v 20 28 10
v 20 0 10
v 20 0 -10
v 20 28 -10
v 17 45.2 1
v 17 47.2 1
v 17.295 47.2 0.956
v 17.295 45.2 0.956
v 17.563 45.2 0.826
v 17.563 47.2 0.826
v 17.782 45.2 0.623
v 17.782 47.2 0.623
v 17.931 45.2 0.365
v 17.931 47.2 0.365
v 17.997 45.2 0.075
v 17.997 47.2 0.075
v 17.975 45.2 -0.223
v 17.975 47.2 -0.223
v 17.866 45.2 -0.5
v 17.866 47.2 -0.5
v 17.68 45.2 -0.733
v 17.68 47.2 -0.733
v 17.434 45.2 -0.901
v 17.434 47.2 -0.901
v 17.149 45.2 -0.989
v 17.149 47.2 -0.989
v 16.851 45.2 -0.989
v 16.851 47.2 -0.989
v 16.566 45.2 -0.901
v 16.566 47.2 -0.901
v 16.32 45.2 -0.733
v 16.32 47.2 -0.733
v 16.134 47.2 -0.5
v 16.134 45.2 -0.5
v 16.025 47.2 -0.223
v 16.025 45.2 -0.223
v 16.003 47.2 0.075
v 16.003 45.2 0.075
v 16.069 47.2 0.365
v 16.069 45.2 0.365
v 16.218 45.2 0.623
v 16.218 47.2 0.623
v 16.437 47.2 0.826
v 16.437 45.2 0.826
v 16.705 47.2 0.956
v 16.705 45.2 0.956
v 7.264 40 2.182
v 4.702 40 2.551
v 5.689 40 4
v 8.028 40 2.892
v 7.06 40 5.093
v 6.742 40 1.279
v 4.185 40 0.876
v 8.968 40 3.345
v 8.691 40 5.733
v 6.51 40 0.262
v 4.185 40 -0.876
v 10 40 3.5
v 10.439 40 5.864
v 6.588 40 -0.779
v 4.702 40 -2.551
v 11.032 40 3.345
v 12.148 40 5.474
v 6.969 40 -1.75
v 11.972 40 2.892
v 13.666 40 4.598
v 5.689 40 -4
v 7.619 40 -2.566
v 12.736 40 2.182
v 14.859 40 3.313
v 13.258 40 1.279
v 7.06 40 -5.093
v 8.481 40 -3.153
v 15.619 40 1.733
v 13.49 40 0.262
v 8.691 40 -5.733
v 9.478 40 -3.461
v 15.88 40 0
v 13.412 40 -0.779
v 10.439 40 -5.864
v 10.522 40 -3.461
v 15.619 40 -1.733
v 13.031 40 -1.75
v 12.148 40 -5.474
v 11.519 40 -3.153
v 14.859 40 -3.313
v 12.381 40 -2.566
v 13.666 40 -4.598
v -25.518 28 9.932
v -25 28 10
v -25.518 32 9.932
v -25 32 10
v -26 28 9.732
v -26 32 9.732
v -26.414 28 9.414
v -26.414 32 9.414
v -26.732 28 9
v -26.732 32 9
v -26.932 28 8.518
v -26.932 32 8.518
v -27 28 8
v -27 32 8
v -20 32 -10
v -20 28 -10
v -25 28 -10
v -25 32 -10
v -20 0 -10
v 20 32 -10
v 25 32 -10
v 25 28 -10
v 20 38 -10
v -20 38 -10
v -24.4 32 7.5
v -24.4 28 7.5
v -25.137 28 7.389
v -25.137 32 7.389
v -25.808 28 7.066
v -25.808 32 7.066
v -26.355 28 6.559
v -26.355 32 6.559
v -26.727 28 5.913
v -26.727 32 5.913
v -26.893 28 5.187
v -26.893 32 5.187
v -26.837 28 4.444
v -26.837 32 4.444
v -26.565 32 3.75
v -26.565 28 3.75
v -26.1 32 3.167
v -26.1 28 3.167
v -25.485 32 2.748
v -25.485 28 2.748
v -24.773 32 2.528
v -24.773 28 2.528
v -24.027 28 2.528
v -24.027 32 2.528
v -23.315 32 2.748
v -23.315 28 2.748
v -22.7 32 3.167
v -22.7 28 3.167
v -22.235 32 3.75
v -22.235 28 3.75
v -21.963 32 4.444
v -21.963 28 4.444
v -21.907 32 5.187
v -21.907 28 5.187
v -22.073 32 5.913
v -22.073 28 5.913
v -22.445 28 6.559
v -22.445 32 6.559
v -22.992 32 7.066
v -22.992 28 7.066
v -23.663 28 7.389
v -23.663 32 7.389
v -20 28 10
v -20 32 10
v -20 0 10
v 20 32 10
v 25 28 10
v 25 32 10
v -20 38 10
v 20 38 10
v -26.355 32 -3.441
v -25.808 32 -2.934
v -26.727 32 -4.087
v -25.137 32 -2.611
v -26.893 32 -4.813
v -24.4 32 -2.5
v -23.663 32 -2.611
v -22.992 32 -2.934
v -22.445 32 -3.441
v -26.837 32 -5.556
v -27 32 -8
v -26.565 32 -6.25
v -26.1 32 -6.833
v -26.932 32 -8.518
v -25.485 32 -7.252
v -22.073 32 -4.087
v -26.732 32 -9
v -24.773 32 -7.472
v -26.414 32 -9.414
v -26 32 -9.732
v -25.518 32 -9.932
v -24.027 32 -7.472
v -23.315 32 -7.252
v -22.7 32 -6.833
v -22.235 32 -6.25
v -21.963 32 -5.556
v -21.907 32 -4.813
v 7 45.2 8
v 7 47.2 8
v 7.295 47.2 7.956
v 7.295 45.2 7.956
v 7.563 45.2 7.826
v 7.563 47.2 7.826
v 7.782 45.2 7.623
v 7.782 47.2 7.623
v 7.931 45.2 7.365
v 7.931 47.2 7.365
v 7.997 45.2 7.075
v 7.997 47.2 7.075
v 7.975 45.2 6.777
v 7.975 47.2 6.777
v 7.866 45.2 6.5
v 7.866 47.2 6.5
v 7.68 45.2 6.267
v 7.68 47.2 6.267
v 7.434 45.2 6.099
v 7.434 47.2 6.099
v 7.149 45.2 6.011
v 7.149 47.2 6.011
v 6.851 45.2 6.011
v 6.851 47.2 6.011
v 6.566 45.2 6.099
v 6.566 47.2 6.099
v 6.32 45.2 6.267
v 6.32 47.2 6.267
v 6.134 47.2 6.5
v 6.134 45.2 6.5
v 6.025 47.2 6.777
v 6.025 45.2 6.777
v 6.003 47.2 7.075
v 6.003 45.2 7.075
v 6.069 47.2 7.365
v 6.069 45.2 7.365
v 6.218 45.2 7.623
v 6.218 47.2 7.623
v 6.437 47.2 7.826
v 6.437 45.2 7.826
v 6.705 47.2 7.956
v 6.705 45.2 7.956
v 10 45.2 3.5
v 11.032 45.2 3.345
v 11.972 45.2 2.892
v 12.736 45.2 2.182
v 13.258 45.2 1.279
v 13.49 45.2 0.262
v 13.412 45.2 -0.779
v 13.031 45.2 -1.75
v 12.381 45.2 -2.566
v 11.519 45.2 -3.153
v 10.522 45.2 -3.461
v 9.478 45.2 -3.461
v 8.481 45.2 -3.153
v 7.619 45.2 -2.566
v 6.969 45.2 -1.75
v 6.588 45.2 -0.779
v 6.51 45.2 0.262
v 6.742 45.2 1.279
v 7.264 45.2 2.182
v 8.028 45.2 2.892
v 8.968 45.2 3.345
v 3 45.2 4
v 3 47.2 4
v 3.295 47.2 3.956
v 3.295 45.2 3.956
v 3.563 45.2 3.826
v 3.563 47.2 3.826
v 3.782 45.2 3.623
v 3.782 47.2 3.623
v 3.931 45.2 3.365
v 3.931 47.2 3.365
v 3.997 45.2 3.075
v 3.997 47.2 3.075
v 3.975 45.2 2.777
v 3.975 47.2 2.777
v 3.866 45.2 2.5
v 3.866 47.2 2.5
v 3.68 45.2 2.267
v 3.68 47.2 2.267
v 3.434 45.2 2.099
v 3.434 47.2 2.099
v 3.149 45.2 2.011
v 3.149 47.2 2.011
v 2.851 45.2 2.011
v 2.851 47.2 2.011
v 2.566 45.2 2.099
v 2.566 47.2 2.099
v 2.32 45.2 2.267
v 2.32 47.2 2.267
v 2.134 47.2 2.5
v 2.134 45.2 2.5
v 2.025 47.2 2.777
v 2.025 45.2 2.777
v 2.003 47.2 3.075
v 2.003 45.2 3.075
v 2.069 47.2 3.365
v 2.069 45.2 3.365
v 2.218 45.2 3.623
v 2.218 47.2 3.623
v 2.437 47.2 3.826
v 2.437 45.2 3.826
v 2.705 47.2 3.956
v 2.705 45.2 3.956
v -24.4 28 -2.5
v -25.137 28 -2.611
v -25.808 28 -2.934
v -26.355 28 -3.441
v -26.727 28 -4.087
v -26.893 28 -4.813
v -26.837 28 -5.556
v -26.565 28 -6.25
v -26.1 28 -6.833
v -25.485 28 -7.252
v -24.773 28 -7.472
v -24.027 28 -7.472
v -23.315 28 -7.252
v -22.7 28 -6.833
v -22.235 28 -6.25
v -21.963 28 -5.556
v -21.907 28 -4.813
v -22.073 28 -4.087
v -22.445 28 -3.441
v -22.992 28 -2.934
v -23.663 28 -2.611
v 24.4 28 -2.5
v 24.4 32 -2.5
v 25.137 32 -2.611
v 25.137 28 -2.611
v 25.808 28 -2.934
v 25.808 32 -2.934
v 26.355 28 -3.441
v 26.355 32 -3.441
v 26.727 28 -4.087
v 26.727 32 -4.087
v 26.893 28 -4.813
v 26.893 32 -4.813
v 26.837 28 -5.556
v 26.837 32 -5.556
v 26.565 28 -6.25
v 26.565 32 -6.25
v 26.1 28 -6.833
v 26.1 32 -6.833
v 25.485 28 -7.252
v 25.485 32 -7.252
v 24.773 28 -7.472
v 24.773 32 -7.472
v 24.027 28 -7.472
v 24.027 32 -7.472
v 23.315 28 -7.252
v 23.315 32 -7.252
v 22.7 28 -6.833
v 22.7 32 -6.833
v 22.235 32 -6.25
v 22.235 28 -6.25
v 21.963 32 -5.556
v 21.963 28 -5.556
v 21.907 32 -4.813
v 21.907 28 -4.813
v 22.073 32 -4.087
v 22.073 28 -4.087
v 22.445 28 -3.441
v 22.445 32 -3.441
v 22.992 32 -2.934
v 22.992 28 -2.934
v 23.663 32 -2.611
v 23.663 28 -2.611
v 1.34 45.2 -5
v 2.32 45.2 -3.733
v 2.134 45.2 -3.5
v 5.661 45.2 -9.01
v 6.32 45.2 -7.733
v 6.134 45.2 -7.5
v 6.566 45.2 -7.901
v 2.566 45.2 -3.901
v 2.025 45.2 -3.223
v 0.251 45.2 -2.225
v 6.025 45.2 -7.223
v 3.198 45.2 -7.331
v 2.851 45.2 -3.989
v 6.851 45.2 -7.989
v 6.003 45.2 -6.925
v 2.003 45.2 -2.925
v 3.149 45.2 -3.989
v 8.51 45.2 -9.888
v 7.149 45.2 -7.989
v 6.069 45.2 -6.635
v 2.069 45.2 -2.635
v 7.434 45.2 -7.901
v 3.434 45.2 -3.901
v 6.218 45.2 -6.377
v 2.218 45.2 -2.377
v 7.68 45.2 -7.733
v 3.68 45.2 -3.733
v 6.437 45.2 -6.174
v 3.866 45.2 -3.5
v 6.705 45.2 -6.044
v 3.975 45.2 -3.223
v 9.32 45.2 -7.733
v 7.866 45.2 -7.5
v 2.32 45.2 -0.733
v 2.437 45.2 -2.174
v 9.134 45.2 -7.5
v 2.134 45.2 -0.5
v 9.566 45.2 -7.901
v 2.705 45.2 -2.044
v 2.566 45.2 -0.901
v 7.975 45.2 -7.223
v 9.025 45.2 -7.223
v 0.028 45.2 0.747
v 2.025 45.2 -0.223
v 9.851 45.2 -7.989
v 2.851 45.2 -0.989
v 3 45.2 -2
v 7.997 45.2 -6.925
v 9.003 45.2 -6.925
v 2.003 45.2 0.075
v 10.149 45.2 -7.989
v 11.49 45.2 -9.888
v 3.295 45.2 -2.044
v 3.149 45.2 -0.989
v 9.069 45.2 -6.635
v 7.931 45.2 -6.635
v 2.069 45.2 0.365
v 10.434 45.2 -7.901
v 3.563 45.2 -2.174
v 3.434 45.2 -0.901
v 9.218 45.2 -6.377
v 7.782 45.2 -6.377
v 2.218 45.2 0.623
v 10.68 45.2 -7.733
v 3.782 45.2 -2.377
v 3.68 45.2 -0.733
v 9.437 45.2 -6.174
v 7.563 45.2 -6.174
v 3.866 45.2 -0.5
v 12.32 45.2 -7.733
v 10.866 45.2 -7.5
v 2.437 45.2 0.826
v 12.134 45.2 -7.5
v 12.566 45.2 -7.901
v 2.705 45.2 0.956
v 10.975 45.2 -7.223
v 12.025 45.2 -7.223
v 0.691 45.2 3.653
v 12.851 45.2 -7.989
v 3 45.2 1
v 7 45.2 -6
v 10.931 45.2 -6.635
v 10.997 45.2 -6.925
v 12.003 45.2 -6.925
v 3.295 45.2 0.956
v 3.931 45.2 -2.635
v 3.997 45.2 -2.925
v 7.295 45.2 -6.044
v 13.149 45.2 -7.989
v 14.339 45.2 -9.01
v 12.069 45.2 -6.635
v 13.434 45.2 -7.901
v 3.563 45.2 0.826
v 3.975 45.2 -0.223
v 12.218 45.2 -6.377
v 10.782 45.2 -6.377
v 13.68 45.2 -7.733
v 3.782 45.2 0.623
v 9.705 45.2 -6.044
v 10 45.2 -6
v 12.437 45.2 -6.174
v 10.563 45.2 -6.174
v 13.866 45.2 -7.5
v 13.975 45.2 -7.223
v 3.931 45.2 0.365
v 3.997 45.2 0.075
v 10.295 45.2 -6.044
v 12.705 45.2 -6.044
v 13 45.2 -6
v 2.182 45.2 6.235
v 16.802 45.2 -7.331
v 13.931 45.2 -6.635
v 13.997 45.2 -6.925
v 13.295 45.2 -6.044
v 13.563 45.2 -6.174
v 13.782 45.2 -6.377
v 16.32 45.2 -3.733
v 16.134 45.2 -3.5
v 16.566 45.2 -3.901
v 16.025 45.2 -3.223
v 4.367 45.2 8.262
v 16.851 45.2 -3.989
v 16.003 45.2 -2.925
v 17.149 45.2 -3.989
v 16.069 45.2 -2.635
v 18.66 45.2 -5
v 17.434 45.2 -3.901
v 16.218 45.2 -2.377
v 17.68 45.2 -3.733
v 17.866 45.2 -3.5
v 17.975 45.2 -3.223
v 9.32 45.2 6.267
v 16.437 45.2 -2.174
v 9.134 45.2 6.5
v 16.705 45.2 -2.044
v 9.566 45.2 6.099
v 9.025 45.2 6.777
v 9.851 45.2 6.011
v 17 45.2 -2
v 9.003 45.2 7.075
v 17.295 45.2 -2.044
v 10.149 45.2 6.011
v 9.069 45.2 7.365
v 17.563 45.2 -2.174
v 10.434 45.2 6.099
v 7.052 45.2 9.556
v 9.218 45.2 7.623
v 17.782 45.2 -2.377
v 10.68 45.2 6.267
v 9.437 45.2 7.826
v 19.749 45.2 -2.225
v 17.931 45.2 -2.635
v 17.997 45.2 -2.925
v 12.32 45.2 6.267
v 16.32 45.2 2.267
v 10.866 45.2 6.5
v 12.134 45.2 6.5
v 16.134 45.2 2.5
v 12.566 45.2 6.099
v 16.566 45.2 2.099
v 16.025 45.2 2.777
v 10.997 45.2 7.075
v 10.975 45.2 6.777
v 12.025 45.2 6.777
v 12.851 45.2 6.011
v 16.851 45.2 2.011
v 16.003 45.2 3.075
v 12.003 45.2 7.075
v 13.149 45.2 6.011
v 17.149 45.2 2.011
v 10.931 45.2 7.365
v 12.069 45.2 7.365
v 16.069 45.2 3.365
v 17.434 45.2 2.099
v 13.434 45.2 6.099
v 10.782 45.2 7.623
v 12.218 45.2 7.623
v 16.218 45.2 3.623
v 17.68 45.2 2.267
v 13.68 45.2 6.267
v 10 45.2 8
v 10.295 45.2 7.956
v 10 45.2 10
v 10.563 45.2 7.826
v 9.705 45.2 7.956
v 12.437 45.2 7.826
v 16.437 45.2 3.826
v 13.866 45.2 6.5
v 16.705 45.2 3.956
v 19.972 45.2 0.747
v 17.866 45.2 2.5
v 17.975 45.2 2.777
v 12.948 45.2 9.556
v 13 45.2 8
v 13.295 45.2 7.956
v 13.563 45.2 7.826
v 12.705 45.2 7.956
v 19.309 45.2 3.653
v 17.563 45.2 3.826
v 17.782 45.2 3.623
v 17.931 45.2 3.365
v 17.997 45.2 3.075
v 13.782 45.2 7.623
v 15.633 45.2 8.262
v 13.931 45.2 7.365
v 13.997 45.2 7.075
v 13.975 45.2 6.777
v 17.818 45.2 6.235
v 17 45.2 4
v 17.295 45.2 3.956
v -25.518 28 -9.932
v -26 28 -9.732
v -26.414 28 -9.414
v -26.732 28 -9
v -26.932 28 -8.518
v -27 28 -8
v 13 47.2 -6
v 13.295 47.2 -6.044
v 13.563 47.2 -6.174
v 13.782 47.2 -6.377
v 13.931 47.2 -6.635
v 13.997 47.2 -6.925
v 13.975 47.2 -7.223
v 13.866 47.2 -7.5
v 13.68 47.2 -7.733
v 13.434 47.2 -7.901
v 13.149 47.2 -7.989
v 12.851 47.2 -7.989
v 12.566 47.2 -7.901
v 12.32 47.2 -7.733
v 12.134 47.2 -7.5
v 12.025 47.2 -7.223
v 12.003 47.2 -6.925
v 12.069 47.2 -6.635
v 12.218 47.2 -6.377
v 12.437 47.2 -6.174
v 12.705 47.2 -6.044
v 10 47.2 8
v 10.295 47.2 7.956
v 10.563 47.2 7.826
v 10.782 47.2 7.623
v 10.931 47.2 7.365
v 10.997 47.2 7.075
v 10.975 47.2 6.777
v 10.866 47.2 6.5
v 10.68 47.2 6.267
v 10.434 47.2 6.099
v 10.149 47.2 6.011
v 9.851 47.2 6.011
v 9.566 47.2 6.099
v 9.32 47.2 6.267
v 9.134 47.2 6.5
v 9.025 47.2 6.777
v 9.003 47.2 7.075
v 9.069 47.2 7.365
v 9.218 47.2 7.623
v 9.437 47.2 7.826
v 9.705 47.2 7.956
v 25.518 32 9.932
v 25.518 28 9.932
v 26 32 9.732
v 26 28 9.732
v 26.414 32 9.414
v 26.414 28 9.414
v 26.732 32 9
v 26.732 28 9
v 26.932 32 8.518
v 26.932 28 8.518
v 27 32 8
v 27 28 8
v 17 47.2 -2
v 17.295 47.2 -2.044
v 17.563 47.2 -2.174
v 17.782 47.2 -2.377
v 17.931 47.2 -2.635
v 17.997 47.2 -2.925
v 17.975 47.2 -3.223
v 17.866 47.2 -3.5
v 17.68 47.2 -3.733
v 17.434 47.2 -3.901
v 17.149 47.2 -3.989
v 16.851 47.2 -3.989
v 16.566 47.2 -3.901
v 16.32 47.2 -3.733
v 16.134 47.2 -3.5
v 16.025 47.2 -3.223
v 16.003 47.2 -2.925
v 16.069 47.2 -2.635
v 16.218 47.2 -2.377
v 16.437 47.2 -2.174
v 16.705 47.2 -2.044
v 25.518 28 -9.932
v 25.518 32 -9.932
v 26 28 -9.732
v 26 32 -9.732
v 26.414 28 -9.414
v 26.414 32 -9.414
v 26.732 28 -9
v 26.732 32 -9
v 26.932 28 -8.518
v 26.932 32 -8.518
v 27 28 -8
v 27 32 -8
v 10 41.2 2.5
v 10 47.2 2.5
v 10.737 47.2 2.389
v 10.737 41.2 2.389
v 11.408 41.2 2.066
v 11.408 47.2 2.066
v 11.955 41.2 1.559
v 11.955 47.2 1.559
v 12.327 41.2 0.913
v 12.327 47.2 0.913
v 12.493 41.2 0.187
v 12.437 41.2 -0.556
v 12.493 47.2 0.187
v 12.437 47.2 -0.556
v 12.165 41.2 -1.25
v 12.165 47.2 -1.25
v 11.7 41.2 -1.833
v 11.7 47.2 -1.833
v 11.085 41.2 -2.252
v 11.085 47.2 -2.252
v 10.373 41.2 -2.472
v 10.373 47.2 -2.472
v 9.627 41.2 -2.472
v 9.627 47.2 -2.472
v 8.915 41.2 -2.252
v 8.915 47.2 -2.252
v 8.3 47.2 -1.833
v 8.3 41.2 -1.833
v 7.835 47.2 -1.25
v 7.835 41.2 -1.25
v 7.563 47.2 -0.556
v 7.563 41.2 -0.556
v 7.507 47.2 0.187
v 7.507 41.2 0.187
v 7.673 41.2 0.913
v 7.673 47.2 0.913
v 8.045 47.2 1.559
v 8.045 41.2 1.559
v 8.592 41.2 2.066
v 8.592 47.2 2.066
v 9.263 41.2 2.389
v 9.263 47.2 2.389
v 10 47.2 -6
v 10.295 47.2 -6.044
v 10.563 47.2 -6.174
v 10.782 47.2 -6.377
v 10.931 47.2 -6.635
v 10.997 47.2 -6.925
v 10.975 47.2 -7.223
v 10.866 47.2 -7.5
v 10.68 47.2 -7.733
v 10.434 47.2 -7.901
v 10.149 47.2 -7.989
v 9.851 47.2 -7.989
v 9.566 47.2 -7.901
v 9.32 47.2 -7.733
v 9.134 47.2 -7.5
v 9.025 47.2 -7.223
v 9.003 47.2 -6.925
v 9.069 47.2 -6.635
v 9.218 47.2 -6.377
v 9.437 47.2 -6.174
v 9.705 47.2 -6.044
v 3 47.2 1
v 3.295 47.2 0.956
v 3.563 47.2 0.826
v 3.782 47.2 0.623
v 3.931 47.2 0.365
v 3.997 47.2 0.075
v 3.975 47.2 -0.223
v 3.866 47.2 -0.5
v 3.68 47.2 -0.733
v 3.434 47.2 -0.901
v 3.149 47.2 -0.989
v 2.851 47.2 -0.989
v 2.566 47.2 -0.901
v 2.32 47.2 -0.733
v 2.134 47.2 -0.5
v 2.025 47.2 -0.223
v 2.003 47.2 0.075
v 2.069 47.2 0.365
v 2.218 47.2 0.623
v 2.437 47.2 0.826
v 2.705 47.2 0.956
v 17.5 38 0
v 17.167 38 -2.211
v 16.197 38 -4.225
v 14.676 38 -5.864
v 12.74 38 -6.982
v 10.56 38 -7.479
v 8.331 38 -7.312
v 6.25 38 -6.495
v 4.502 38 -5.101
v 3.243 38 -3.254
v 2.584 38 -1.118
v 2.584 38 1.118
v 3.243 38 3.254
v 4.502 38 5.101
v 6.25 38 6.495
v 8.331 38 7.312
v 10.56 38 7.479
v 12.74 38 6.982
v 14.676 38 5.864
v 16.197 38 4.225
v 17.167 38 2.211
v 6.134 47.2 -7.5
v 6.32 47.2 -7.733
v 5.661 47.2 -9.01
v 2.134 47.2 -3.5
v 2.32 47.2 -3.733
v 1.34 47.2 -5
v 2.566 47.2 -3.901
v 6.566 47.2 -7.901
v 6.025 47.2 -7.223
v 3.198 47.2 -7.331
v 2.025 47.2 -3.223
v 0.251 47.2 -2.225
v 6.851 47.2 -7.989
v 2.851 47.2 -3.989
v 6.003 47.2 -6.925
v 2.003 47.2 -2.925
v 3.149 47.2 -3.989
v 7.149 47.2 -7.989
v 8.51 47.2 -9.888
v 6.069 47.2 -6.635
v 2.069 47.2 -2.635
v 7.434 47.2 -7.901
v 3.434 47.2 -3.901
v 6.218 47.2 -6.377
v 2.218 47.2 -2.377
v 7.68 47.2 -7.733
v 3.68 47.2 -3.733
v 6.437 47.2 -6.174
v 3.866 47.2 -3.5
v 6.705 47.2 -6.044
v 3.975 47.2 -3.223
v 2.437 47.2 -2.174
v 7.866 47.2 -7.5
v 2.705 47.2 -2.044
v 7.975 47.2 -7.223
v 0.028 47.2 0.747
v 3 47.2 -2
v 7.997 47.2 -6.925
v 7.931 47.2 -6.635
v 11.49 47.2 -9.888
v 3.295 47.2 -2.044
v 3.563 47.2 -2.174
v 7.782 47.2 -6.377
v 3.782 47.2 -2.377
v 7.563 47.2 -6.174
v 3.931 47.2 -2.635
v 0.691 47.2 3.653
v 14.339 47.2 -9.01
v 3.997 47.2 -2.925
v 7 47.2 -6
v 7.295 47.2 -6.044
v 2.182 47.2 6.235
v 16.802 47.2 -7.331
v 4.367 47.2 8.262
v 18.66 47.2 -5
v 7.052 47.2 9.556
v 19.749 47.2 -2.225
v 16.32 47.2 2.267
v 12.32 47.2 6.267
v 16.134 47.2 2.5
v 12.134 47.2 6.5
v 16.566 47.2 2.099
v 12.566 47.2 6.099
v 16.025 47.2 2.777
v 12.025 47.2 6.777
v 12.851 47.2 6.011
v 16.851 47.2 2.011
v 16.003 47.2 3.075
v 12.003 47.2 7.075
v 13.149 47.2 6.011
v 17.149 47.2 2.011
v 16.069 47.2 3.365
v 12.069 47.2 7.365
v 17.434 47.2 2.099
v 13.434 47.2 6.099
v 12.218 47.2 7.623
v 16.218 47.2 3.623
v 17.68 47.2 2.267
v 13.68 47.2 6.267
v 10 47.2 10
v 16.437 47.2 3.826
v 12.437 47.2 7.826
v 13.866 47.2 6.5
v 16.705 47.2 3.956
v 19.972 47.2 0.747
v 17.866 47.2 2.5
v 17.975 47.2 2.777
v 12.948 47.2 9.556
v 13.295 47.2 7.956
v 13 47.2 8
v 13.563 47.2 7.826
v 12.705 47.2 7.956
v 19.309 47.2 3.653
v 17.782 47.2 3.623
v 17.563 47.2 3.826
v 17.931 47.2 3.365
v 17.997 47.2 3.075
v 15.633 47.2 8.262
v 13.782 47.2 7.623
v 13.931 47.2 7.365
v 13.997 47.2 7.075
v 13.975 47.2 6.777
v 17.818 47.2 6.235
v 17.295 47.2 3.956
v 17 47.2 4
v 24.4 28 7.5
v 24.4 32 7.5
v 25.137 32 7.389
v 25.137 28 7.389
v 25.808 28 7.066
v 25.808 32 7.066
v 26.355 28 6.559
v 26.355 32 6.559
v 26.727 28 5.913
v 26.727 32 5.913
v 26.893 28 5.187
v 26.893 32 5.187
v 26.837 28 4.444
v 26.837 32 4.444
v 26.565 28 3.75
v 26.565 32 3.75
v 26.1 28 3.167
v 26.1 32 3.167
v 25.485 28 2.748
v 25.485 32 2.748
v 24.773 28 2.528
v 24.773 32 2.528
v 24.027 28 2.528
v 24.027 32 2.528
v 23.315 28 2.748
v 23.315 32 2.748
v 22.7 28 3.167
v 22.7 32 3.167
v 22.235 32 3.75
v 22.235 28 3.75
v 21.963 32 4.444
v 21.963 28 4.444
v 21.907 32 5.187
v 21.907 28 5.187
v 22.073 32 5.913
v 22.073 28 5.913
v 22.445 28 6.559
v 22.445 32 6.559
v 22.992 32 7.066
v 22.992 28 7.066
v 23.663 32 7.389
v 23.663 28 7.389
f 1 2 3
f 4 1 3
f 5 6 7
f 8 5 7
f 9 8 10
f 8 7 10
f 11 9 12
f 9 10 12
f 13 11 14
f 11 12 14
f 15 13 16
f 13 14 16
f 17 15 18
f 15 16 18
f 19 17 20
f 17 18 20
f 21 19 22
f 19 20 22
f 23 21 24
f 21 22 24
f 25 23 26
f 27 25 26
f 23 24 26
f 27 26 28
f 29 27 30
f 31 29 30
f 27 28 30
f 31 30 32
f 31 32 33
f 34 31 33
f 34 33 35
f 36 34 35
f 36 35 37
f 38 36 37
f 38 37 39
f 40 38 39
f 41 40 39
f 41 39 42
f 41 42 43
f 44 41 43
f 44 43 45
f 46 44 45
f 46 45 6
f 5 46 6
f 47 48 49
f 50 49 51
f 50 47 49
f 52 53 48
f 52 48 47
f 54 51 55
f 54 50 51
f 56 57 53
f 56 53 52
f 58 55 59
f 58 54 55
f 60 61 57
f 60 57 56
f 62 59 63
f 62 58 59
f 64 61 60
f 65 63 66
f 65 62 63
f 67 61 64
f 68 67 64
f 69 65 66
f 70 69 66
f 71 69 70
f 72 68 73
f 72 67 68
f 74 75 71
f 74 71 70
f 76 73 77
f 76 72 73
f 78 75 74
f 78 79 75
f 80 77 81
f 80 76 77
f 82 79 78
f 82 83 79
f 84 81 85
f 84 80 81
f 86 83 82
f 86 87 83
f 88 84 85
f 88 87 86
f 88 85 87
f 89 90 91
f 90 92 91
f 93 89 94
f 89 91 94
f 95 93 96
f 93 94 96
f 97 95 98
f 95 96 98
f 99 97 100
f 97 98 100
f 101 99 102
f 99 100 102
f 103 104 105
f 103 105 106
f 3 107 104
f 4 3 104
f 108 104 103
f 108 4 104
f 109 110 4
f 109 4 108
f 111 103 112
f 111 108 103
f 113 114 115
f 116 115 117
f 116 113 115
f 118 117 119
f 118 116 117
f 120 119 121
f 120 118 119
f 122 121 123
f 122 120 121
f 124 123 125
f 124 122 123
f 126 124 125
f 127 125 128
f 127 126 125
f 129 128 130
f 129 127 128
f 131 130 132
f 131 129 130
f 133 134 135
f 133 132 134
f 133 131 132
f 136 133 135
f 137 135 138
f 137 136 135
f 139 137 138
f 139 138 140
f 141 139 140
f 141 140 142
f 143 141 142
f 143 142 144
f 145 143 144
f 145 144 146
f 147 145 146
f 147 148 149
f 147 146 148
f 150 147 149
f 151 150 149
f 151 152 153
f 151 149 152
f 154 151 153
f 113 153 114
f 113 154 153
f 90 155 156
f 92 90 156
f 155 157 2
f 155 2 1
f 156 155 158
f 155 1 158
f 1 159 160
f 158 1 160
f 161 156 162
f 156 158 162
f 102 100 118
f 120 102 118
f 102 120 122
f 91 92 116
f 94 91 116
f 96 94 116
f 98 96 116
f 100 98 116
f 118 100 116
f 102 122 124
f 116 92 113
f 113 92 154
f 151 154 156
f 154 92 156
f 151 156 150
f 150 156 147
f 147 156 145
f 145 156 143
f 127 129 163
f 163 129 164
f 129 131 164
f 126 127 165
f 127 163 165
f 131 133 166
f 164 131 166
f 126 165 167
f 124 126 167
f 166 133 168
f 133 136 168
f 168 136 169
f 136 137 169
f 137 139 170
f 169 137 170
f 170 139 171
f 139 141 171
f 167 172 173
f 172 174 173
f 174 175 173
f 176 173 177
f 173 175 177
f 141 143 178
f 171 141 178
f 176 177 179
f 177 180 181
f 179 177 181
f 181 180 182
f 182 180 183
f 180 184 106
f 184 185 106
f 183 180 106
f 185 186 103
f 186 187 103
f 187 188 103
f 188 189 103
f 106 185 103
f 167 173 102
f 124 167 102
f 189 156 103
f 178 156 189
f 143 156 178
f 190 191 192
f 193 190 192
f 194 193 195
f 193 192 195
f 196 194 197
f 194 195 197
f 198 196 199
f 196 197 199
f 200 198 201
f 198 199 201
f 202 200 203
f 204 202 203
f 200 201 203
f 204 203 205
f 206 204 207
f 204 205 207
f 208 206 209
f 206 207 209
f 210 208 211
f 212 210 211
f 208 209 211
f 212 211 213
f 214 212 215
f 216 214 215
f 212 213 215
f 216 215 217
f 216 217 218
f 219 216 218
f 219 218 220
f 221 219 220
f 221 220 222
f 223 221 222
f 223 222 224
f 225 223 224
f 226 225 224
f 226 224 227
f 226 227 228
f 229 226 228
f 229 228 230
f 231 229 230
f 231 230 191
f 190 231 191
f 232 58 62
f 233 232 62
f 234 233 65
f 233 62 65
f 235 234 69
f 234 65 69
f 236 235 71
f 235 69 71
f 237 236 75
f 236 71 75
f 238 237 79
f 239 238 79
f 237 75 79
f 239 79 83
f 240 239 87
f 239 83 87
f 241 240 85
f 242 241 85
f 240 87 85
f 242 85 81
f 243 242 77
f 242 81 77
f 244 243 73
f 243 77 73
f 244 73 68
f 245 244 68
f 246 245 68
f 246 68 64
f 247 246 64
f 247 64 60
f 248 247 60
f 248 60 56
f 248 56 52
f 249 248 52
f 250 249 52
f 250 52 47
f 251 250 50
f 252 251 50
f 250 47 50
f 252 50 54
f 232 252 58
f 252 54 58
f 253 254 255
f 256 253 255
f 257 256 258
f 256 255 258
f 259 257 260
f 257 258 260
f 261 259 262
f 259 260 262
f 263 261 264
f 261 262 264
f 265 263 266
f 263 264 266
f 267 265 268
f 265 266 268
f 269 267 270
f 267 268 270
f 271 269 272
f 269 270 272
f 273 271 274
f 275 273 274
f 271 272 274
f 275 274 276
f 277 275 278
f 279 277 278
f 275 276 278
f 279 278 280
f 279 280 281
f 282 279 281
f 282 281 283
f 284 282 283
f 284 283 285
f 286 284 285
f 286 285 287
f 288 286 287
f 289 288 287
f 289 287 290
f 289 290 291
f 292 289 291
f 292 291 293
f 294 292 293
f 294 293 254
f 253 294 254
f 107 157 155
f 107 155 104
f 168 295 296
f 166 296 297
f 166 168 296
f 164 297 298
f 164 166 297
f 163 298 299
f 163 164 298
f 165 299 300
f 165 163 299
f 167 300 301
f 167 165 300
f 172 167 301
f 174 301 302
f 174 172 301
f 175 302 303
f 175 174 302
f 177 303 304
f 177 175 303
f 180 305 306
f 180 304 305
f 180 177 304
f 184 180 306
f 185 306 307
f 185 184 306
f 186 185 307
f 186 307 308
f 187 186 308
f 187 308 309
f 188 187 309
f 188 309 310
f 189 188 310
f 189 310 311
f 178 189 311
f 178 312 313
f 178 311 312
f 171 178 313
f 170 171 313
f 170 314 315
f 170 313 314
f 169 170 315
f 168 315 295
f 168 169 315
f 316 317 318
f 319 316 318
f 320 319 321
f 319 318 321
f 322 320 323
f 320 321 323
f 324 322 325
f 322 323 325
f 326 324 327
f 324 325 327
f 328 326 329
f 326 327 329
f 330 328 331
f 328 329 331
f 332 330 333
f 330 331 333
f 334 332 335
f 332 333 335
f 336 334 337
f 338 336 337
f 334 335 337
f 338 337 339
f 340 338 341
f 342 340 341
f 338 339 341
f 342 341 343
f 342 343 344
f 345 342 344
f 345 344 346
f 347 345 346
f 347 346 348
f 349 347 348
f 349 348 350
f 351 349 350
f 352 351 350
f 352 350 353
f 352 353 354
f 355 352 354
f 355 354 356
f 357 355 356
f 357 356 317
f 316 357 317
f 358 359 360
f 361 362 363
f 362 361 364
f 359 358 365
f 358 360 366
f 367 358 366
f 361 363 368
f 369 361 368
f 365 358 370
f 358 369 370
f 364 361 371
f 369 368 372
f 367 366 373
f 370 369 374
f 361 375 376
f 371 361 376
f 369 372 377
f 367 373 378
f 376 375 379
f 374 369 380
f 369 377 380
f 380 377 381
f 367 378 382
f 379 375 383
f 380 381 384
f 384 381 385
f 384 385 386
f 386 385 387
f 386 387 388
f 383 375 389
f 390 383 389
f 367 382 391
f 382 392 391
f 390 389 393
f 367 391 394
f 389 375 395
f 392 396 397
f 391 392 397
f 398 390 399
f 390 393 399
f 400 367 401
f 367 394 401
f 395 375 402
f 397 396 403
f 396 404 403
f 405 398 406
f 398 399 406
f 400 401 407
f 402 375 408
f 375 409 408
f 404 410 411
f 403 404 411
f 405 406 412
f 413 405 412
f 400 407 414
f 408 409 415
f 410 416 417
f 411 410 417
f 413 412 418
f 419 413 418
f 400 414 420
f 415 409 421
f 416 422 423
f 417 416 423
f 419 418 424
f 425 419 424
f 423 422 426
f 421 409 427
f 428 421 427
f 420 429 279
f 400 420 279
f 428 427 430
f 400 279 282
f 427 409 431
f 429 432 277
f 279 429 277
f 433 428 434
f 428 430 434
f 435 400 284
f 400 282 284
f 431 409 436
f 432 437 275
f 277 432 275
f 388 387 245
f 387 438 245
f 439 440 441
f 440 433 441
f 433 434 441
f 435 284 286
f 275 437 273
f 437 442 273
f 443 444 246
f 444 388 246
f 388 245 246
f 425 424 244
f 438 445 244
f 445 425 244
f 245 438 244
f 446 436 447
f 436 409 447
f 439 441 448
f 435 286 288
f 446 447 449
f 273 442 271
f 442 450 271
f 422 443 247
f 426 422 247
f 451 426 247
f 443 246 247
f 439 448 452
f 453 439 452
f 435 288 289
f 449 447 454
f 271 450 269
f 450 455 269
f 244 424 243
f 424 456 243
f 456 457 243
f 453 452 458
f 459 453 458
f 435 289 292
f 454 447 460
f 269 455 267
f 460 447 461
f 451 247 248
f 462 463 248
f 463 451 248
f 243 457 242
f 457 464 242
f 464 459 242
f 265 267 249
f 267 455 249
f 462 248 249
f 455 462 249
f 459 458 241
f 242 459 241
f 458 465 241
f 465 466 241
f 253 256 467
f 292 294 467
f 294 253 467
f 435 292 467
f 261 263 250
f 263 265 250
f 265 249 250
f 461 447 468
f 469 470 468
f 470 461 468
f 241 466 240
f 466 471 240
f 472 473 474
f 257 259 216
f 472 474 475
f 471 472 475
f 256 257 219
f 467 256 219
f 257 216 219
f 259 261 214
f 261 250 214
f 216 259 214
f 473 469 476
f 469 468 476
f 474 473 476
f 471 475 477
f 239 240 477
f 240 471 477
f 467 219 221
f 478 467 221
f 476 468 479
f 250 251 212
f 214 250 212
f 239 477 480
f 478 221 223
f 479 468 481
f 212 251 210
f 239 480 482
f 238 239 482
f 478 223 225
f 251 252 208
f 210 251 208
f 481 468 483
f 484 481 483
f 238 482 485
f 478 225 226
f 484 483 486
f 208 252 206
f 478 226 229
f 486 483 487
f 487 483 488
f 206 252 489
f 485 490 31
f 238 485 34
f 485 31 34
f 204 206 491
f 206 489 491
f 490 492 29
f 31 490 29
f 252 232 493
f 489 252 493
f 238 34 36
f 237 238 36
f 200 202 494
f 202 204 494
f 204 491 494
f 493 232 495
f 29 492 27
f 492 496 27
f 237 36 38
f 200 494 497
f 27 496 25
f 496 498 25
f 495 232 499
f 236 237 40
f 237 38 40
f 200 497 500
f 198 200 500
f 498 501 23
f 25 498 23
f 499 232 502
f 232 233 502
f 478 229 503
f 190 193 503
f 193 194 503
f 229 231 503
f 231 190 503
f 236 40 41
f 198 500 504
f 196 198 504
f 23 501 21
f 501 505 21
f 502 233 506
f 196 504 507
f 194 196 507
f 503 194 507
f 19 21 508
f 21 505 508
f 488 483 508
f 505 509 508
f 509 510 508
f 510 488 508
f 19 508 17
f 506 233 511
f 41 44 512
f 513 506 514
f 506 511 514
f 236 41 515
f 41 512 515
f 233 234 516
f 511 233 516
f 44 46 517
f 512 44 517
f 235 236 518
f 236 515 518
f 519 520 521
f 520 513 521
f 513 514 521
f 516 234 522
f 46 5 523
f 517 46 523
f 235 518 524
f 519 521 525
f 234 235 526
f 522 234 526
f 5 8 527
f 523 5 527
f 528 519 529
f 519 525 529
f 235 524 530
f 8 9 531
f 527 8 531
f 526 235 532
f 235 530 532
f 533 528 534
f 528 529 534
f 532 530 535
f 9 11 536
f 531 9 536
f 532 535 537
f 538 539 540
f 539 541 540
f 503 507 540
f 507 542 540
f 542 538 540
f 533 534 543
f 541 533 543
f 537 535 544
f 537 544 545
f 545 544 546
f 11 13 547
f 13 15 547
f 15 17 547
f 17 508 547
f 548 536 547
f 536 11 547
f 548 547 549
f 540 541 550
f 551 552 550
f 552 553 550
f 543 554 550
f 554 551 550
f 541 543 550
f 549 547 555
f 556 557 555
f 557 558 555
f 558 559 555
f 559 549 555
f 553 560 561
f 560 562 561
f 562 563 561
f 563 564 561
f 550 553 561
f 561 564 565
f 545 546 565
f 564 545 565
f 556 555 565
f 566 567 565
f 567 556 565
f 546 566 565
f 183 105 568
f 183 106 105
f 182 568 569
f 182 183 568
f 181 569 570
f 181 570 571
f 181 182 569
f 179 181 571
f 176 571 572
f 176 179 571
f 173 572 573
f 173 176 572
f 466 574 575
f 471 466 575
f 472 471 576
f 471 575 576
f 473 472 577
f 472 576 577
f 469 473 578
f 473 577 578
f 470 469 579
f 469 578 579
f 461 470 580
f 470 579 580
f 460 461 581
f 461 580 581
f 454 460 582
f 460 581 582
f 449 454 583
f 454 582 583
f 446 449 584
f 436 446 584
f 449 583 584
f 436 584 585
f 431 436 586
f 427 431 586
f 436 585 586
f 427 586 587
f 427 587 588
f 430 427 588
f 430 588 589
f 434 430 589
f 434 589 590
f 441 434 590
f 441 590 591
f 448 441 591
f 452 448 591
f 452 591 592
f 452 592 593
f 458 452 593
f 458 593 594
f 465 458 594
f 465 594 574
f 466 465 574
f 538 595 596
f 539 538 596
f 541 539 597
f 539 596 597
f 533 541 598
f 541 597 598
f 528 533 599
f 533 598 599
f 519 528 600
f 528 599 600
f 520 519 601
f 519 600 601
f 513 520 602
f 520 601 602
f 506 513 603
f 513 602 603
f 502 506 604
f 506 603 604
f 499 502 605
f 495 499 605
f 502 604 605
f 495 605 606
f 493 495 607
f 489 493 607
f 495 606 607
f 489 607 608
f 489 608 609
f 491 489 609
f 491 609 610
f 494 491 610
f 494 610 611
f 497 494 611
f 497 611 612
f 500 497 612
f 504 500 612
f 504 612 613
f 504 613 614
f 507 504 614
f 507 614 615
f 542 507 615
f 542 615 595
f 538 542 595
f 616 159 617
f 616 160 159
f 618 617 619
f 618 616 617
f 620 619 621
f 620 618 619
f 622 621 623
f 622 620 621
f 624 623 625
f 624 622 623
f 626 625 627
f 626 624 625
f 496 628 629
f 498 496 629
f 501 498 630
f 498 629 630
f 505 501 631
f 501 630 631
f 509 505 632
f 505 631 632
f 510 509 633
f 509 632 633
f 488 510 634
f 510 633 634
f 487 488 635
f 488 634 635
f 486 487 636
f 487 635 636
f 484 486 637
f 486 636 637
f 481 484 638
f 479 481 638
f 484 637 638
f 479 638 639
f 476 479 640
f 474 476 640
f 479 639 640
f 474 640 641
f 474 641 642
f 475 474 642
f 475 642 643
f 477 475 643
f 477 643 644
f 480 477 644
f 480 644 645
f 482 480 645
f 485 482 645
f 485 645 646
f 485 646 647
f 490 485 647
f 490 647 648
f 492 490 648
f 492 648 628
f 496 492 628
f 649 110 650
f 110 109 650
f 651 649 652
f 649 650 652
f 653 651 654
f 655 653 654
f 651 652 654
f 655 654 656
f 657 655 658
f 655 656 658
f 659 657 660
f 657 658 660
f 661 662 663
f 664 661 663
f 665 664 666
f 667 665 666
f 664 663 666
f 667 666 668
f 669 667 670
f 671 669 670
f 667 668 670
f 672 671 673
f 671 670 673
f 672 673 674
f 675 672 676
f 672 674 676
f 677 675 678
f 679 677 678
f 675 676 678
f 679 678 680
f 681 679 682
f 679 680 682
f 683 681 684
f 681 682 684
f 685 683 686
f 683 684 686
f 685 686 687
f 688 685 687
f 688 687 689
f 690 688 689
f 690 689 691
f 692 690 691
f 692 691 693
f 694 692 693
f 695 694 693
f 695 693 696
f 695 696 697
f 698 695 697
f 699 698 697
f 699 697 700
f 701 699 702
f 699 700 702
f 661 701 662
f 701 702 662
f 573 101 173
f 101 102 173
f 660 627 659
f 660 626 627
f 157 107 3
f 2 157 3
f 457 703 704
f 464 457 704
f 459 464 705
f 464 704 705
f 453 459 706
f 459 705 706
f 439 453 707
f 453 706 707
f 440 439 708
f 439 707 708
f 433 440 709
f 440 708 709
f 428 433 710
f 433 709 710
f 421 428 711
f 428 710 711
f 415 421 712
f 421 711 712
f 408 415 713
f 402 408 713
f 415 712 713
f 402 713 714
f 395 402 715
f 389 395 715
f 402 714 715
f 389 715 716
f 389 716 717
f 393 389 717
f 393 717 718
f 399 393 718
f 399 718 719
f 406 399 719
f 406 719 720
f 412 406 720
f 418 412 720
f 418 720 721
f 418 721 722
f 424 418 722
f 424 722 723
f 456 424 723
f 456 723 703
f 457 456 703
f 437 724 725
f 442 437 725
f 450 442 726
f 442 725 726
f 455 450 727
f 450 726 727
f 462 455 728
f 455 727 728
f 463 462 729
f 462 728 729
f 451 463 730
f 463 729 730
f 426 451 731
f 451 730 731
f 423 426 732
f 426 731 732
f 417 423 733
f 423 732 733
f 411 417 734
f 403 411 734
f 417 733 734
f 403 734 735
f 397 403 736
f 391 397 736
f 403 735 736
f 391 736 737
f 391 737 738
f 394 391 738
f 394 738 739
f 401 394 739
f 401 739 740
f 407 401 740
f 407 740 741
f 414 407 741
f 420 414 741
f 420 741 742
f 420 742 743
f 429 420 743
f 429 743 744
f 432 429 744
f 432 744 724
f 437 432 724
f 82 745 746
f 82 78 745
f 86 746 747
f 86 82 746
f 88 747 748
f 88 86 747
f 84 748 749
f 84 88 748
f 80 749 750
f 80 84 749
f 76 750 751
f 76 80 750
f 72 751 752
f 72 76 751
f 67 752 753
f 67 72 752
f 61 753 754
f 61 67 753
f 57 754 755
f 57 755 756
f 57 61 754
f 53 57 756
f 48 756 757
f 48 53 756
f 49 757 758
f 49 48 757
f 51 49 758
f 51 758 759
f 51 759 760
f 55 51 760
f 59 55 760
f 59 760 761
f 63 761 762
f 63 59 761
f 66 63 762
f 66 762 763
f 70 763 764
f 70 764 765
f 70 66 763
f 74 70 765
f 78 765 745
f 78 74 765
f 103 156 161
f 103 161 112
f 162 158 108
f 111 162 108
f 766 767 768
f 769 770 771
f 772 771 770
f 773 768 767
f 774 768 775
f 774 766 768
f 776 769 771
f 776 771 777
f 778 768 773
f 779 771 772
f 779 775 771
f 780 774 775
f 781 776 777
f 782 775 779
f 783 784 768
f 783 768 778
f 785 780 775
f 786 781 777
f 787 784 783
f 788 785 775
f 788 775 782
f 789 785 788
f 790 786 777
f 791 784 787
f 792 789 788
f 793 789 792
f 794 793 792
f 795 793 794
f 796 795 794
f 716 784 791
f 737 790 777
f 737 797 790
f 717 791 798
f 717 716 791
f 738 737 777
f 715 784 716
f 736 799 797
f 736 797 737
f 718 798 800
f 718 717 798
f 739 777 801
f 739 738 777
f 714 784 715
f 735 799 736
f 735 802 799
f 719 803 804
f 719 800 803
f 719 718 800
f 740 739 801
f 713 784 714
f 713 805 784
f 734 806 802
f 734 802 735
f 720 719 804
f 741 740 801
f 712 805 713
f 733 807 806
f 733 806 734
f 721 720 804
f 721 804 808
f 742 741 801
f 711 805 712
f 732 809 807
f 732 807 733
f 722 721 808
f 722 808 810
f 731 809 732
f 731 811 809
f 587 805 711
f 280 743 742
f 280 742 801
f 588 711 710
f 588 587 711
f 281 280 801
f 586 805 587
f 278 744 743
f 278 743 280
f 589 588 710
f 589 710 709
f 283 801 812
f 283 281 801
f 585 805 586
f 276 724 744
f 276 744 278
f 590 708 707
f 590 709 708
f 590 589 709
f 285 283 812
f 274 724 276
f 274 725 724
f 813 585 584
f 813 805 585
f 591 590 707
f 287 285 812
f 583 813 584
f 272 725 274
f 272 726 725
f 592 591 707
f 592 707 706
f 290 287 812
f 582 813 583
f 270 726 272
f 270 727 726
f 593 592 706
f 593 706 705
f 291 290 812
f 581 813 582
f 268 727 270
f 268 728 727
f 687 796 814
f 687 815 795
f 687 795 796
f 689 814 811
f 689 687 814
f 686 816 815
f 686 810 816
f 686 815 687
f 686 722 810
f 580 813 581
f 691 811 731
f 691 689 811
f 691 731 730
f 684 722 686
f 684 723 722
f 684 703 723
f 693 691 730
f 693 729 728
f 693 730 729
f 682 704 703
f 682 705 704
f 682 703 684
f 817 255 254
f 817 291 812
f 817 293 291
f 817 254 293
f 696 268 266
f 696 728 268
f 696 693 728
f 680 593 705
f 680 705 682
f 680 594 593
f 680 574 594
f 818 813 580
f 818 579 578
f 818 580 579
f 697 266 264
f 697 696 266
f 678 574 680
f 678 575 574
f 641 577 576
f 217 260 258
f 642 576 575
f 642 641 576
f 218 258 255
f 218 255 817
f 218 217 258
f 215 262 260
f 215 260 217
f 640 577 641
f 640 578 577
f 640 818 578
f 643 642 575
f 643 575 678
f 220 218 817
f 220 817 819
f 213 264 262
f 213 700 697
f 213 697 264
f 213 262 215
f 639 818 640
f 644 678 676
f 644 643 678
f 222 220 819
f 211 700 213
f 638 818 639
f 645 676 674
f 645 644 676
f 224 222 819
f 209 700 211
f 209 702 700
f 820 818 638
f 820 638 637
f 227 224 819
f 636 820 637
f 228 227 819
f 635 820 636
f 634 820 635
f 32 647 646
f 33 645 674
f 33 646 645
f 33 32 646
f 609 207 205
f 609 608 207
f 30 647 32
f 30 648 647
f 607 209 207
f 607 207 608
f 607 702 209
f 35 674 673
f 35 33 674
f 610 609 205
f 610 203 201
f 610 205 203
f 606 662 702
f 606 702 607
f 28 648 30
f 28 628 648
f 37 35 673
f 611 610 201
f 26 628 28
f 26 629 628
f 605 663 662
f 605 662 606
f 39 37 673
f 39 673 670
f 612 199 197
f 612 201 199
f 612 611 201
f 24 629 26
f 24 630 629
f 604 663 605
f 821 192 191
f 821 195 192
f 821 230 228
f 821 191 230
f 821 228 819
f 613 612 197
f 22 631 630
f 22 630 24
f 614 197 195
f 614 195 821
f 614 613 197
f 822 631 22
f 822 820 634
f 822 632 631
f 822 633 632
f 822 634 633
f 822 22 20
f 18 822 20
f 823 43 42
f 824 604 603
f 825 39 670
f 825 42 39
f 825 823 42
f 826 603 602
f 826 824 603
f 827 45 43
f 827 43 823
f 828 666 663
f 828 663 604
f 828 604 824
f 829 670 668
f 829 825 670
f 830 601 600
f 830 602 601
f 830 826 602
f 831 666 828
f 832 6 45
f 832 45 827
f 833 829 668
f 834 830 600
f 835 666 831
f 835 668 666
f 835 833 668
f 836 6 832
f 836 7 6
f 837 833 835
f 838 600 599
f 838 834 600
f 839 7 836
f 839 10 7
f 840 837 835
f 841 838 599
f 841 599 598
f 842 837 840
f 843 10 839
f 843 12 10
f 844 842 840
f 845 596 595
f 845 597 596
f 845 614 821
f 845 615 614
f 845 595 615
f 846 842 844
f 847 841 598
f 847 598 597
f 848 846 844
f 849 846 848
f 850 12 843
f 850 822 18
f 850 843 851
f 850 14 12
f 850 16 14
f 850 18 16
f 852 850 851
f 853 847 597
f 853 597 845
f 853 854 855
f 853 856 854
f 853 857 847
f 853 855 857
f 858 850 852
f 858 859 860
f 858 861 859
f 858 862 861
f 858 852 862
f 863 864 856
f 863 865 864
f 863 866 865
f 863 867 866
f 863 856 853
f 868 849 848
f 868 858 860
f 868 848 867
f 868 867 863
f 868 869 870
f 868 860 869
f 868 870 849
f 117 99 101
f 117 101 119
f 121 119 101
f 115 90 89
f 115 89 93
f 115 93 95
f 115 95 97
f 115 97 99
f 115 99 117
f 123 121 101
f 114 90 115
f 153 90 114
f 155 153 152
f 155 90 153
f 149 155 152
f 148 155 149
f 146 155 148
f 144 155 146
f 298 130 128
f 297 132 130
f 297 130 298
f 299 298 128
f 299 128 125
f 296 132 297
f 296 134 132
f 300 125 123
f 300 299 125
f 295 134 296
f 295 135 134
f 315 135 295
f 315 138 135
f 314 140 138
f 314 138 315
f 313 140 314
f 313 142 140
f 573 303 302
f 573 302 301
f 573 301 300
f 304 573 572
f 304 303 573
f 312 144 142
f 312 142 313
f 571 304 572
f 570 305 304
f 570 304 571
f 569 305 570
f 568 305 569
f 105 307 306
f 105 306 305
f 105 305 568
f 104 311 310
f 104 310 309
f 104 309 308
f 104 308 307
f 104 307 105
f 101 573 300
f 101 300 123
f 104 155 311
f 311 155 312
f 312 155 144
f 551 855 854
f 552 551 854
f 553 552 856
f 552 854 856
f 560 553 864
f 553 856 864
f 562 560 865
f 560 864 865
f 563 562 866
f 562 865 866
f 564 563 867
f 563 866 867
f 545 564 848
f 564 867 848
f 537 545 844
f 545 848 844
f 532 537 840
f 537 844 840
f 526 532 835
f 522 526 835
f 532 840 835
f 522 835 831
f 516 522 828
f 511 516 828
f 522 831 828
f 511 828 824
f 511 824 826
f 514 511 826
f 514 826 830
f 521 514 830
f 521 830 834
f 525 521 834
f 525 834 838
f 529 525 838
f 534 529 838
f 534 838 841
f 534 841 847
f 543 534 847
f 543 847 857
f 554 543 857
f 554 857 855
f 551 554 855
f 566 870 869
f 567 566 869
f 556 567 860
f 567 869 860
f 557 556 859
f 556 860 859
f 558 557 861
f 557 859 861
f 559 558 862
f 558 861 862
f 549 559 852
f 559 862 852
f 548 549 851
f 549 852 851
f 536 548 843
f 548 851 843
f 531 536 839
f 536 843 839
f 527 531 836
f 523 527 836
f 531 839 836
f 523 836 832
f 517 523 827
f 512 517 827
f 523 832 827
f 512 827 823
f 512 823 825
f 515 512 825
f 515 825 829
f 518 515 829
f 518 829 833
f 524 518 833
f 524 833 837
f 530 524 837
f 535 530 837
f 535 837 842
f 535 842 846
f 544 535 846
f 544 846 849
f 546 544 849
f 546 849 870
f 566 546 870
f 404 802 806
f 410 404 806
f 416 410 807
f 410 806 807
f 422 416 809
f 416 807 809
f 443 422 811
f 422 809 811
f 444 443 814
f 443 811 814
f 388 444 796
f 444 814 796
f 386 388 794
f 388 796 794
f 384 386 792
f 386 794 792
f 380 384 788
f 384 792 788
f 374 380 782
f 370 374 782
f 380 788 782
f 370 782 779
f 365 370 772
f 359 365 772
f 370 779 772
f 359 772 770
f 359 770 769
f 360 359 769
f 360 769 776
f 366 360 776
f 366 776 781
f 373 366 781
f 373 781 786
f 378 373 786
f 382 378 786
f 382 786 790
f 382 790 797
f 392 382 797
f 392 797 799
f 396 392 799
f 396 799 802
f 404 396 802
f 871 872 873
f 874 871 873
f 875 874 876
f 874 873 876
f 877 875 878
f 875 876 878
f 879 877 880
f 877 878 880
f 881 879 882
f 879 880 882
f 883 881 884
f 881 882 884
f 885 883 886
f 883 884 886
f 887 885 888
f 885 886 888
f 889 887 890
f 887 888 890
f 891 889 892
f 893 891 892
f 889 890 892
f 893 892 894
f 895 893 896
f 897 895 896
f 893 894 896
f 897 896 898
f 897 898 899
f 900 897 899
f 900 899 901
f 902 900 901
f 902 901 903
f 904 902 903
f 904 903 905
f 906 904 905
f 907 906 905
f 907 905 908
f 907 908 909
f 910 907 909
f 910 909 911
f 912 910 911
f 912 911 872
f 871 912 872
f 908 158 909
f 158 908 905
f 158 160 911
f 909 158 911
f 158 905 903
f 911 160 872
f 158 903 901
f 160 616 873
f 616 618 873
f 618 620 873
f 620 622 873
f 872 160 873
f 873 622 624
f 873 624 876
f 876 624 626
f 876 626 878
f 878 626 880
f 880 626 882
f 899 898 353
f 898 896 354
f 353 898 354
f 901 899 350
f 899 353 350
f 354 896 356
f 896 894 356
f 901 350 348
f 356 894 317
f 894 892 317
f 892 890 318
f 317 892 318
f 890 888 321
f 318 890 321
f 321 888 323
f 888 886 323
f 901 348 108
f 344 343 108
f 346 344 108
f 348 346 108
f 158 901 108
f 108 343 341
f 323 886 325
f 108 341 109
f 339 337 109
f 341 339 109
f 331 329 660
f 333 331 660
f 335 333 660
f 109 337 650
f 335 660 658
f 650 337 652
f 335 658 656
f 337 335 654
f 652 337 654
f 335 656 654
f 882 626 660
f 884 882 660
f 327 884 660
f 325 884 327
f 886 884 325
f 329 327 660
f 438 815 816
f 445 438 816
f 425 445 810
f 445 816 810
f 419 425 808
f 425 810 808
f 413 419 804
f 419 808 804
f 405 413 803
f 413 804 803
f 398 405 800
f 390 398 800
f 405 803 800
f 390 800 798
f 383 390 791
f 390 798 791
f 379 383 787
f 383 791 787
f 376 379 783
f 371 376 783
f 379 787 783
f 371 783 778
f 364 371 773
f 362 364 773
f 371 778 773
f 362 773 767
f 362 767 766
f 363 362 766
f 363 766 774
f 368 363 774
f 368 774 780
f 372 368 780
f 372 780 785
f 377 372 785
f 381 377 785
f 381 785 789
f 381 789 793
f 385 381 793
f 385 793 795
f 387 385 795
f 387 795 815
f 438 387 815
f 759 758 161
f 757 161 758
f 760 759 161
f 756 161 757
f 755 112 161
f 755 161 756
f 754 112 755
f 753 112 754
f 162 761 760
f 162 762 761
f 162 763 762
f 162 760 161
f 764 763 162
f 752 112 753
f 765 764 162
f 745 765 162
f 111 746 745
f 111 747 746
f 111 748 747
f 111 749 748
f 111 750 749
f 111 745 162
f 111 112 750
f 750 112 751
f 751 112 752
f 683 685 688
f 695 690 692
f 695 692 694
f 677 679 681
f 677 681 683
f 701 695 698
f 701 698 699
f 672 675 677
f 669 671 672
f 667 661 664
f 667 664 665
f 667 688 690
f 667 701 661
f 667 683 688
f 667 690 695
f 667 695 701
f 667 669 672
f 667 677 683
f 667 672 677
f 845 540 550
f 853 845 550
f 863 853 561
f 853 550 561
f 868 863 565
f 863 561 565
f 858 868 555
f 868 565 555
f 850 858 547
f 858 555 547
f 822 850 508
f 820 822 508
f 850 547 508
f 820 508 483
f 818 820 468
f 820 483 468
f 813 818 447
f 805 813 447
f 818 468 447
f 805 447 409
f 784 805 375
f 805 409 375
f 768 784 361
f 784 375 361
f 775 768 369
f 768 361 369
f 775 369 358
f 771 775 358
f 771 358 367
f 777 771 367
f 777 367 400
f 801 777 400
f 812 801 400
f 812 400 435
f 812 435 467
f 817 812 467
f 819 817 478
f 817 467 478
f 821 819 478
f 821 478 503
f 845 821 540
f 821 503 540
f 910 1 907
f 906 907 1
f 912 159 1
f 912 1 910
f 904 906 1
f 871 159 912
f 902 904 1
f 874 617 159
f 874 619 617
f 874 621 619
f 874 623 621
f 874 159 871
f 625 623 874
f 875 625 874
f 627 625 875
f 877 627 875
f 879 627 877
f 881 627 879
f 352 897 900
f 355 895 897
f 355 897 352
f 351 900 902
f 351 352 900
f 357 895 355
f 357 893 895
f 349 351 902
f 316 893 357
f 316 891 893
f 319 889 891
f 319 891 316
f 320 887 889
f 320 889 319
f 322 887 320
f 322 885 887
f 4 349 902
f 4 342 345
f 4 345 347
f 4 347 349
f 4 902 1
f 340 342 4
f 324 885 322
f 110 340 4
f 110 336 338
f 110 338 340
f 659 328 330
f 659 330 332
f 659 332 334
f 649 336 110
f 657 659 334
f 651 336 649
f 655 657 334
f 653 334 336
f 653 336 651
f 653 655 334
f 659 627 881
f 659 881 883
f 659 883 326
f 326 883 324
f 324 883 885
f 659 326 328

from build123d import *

# Parameters (mm, degrees)
SKETCH1_W           = 40
SKETCH1_H           = 20
BOSS_EXTRUDE1_DEPTH = 38
SKETCH2_W           = 20
SKETCH2_H           = 4
BOSS_EXTRUDE2_DEPTH = 27
SKETCH3_R           = 2.5
CUT_EXTRUDE5_DEPTH  = 53.6
SKETCH4_R           = 7.5
BOSS_EXTRUDE3_DEPTH = 2
BOSS_EXTRUDE3_TAPER = 39
SKETCH5_R           = 3.5
BOSS_EXTRUDE4_DEPTH = 5.2
SKETCH6_R           = 10
BOSS_EXTRUDE5_DEPTH = 2
FILLET1_R           = 2
SKETCH7_R           = 2.5
SKETCH7_R_2         = 1
CUT_EXTRUDE9_DEPTH  = 6


with BuildPart() as part:
    # Sketch1 → Boss-Extrude1 (new body)
    with BuildSketch(Plane(origin=(0, 0, 0), x_dir=(1, 0, 0), z_dir=(0, 1, 0))):
        Rectangle(SKETCH1_W, SKETCH1_H)
    extrude(amount=BOSS_EXTRUDE1_DEPTH)

    # Sketch2 → Boss-Extrude2 (add, symmetric)
    with BuildSketch(Plane(origin=(0, 0, 0), x_dir=(0, 0, -1), z_dir=(1, 0, 0))):
        with Locations((0, 30)):
            Rectangle(SKETCH2_W, SKETCH2_H)
    extrude(amount=BOSS_EXTRUDE2_DEPTH, both=True)

    # Sketch3 → Cut-Extrude5 (cut)
    with BuildSketch(Plane(origin=(0, 32, 0), x_dir=(1, 0, 0), z_dir=(0, 1, 0))):
        with Locations(Location((24.4, 5, 0), (0, 0, 270))):
            Circle(SKETCH3_R)
        with Locations(Location((24.4, -5, 0), (0, 0, 270))):
            Circle(SKETCH3_R)
    cut_extrude5 = extrude(amount=-CUT_EXTRUDE5_DEPTH, mode=Mode.SUBTRACT)

    # Mirror1: Cut-Extrude5 across plane
    add(cut_extrude5.mirror(Plane(origin=(0, 0, 0), x_dir=(0, 0, 1), z_dir=(1, 0, 0))), mode=Mode.SUBTRACT)

    # Sketch4 → Boss-Extrude3 (add)
    with BuildSketch(Plane(origin=(0, 38, 0), x_dir=(1, 0, 0), z_dir=(0, 1, 0))):
        with Locations((10, 0)):
            Circle(SKETCH4_R)
    extrude(amount=BOSS_EXTRUDE3_DEPTH, taper=BOSS_EXTRUDE3_TAPER)

    # Sketch5 → Boss-Extrude4 (add)
    with BuildSketch(Plane(origin=(0, 40, 0), x_dir=(1, 0, 0), z_dir=(0, 1, 0))):
        with Locations(Location((10, 0, 0), (0, 0, 270))):
            Circle(SKETCH5_R)
    extrude(amount=BOSS_EXTRUDE4_DEPTH)

    # Sketch6 → Boss-Extrude5 (add)
    with BuildSketch(Plane(origin=(0, 45.2, 0), x_dir=(1, 0, 0), z_dir=(0, 1, 0))):
        with Locations(Location((10, 0, 0), (0, 0, 270))):
            Circle(SKETCH6_R)
    extrude(amount=BOSS_EXTRUDE5_DEPTH)

    # Fillet1
    fillet1_edges = [part.edges().sort_by_distance(p)[0] for p in [
        (-27, 30, -10),
        (-27, 30, 10),
        (27, 30, -10),
        (27, 30, 10),
    ]]
    fillet(fillet1_edges, radius=FILLET1_R)

    # Sketch7 → Cut-Extrude9 (cut)
    with BuildSketch(Plane(origin=(0, 47.2, 0), x_dir=(1, 0, 0), z_dir=(0, 1, 0))):
        with Locations(Location((10, 0, 0), (0, 0, 270))):
            Circle(SKETCH7_R)
        with Locations(Location((10, 7, 0), (0, 0, 270))):
            Circle(SKETCH7_R_2)
        with Locations(Location((13, 7, 0), (0, 0, 270))):
            Circle(SKETCH7_R_2)
        with Locations(Location((7, 7, 0), (0, 0, 270))):
            Circle(SKETCH7_R_2)
        with Locations(Location((17, 3, 0), (0, 0, 270))):
            Circle(SKETCH7_R_2)
        with Locations(Location((17, 0, 0), (0, 0, 270))):
            Circle(SKETCH7_R_2)
        with Locations(Location((17, -3, 0), (0, 0, 270))):
            Circle(SKETCH7_R_2)
        with Locations(Location((13, -7, 0), (0, 0, 270))):
            Circle(SKETCH7_R_2)
        with Locations(Location((10, -7, 0), (0, 0, 270))):
            Circle(SKETCH7_R_2)
        with Locations(Location((7, -7, 0), (0, 0, 270))):
            Circle(SKETCH7_R_2)
        with Locations(Location((3, -3, 0), (0, 0, 270))):
            Circle(SKETCH7_R_2)
        with Locations(Location((3, 0, 0), (0, 0, 270))):
            Circle(SKETCH7_R_2)
        with Locations(Location((3, 3, 0), (0, 0, 270))):
            Circle(SKETCH7_R_2)
    extrude(amount=-CUT_EXTRUDE9_DEPTH, mode=Mode.SUBTRACT)


solid = part.part
